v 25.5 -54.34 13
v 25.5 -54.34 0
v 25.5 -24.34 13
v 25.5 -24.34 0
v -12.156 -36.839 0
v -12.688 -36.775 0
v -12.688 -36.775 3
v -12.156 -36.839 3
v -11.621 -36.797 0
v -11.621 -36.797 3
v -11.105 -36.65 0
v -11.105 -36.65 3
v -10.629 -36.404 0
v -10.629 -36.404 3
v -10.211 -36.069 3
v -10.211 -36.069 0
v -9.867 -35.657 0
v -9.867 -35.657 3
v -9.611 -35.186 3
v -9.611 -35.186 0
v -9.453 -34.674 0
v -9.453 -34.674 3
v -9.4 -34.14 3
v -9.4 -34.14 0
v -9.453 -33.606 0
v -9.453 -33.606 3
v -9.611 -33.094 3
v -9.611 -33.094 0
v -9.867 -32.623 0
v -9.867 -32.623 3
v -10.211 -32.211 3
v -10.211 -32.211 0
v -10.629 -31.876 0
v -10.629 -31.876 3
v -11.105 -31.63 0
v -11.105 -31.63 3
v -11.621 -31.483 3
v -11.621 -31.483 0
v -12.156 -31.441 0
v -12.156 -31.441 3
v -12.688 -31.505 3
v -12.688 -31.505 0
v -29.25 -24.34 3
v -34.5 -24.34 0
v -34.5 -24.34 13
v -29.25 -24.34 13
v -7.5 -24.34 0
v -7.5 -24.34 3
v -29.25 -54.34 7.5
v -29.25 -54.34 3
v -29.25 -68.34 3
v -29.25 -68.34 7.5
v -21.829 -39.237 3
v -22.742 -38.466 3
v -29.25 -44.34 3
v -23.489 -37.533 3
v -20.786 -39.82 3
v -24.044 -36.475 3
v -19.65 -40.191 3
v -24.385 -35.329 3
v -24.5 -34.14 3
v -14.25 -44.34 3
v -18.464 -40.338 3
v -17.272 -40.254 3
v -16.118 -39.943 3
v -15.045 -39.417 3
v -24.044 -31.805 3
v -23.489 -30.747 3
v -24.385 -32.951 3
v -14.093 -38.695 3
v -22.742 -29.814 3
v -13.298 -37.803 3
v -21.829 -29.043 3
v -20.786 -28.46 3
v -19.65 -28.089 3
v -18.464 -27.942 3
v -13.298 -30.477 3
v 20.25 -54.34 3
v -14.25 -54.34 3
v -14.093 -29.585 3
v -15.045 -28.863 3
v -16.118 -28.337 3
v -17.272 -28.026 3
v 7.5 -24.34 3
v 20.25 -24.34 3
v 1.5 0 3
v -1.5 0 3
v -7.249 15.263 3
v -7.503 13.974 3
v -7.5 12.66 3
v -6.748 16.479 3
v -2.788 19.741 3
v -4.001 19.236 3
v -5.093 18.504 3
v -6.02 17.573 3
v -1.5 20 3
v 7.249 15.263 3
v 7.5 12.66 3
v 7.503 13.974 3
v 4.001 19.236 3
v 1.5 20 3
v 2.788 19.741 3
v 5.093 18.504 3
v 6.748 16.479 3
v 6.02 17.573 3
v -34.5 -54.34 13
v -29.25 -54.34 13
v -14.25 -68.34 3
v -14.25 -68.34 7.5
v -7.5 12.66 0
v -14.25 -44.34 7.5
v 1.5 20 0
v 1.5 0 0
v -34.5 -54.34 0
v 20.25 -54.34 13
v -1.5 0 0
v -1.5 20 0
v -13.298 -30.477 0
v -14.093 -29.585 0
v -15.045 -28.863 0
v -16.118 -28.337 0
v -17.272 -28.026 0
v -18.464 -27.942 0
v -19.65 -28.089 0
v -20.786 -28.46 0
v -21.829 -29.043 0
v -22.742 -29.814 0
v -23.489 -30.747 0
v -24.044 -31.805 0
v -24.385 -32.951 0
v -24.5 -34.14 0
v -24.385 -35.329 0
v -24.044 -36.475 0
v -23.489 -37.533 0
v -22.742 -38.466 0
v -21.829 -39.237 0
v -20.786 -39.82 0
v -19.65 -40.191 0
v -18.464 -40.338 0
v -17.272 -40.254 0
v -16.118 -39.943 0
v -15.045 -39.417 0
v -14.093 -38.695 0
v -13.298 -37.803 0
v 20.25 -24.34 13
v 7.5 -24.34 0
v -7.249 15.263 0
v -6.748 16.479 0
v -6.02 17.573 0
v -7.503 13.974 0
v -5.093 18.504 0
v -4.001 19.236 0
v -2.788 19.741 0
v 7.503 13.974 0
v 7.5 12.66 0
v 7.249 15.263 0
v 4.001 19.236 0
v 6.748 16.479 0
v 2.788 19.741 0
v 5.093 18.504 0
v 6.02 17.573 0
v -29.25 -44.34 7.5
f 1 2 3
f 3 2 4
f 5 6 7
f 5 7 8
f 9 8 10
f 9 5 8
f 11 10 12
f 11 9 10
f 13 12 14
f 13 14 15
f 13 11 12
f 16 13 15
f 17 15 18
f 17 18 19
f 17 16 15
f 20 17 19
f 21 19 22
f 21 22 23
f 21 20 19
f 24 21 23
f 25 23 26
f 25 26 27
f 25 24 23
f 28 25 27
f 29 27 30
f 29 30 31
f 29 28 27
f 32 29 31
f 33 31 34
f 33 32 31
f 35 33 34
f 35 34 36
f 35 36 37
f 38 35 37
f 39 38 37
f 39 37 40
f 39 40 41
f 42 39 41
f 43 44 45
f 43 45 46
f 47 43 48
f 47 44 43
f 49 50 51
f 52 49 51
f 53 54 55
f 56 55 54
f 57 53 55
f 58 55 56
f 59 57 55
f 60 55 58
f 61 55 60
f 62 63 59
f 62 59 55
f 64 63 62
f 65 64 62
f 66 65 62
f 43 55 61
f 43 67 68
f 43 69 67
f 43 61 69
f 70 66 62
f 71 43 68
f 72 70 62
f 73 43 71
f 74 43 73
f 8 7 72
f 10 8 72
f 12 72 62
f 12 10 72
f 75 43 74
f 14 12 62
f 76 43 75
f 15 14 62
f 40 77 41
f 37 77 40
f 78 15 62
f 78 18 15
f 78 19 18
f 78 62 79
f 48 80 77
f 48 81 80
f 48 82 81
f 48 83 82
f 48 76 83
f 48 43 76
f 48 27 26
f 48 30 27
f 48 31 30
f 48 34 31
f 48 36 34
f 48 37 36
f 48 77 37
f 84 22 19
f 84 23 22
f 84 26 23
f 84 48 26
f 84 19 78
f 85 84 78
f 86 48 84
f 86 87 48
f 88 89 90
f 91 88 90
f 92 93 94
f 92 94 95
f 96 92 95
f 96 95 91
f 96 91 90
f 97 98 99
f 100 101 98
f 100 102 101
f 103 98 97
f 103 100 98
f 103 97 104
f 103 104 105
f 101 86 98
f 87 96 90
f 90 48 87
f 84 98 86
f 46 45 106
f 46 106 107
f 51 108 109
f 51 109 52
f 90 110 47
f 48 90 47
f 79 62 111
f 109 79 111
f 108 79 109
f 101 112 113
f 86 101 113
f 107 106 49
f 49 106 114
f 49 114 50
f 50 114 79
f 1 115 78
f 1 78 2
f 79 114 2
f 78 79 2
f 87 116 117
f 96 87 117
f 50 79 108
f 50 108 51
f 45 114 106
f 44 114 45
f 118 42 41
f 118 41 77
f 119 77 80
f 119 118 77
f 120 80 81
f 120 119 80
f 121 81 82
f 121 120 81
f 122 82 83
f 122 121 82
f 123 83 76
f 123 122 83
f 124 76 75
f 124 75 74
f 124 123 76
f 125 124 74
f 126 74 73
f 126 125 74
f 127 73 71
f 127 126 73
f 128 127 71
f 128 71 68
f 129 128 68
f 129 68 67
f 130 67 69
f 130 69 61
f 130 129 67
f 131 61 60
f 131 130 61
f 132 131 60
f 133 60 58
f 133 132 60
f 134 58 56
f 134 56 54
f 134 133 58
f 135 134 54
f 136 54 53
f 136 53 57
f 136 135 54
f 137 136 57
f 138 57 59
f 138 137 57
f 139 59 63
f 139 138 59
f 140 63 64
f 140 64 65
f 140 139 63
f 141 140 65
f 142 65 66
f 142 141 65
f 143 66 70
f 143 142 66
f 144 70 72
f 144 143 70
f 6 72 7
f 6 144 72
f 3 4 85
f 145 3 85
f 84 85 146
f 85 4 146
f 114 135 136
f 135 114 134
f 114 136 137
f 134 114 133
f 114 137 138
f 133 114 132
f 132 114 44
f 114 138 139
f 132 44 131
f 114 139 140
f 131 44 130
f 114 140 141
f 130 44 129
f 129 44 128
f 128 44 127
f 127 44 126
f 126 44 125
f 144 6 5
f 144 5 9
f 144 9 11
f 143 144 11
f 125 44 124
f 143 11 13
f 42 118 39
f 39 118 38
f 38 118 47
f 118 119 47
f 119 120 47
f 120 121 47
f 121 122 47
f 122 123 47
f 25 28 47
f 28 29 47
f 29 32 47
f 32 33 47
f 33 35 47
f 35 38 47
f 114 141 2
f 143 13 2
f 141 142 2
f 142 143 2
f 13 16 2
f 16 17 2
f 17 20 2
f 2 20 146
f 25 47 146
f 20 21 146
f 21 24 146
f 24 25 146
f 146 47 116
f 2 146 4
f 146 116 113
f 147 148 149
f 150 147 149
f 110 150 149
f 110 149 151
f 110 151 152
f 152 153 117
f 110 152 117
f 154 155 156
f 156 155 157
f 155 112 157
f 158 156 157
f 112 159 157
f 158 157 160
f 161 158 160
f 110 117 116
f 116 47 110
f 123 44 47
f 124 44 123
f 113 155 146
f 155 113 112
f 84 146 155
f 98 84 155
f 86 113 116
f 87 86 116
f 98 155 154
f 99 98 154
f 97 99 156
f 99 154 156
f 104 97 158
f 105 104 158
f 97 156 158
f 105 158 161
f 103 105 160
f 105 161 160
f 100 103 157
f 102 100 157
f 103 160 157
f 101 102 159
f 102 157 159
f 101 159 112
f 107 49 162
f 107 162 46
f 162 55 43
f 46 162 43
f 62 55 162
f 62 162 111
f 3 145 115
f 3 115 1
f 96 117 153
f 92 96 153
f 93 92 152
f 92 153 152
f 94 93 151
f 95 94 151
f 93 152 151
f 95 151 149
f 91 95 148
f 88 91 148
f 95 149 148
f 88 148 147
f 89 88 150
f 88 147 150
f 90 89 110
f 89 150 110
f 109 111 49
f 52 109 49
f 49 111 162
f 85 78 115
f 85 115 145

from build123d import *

# Parameters (mm, degrees)
BOSS_EXTRUDE1_DEPTH = 3
SKETCH2_W           = 5.25
SKETCH2_H           = 30
BOSS_EXTRUDE2_DEPTH = 10
BOSS_EXTRUDE3_DEPTH = 4.5


with BuildPart() as part:
    # Sketch1 → Boss-Extrude1 (new body)
    with BuildSketch(Plane.XY):
        with BuildLine():
            Line((1.5, 0), (-1.5, 0))
            Line((-1.5, 0), (-1.5, 20))
            ThreePointArc((-1.5, 20), (-6.020163774, 17.572640687), (-7.5, 12.66))
            Line((-7.5, 12.66), (-7.5, 0))
            Line((-7.5, 0), (-7.5, -24.34))
            Line((-7.5, -24.34), (-34.5, -24.34))
            Line((-34.5, -24.34), (-34.5, -54.34))
            Line((-34.5, -54.34), (25.5, -54.34))
            Line((25.5, -54.34), (25.5, -24.34))
            Line((25.5, -24.34), (7.5, -24.34))
            Line((7.5, -24.34), (7.5, 0))
            Line((7.5, 0), (7.5, 12.66))
            ThreePointArc((7.5, 12.66), (6.020163774, 17.572640687), (1.5, 20))
            Line((1.5, 20), (1.5, 0))
        make_face()
        with BuildLine():
            ThreePointArc((-12.687903226, -31.50478278), (-24.5, -34.14), (-12.687903226, -36.77521722))
            ThreePointArc((-12.687903226, -36.77521722), (-9.4, -34.14), (-12.687903226, -31.50478278))
        make_face(mode=Mode.SUBTRACT)
    extrude(amount=BOSS_EXTRUDE1_DEPTH)

    # Sketch2 → Boss-Extrude2 (add)
    with BuildSketch(Plane.XY.offset(3)):
        with Locations((-31.875, -39.34)):
            Rectangle(SKETCH2_W, SKETCH2_H)
        with Locations((22.875, -39.34)):
            Rectangle(SKETCH2_W, SKETCH2_H)
    extrude(amount=BOSS_EXTRUDE2_DEPTH)

    # Sketch3 → Boss-Extrude3 (add)
    with BuildSketch(Plane.XY.offset(3)):
        Polygon((-29.25, -54.34), (-29.25, -44.34), (-14.25, -44.34), (-14.25, -68.34), (-29.25, -68.34), align=None)
    extrude(amount=BOSS_EXTRUDE3_DEPTH)


solid = part.part
